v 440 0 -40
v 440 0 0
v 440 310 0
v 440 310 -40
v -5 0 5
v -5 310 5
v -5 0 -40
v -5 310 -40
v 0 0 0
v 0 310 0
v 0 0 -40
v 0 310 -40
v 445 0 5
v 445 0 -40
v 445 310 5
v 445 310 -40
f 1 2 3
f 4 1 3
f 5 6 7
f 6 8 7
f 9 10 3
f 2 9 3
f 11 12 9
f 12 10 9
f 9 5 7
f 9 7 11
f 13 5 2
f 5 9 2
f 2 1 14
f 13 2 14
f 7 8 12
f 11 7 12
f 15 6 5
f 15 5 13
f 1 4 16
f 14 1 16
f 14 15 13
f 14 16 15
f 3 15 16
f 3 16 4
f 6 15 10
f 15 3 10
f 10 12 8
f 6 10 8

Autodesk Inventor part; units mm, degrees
ref_plane "YZ Plane" through (0, 0, 0) normal (1, 0, 0) x (0, 1, 0)
ref_plane "XZ Plane" through (0, 0, 0) normal (0, 1, 0) x (-1, 0, 0)
ref_plane "XY Plane" through (0, 0, 0) normal (0, 0, 1) x (1, 0, 0)
sketch "Esboço1" plane through (0, 0, 0) normal (0, 0, 1) x (1, 0, 0)
  line L0 (0, 0) -> (440, 0)
  line L1 (440, 0) -> (440, 310)
  line L2 (440, 310) -> (0, 310)
  line L3 (0, 310) -> (0, 0)
  line L4 (440, 310) -> (445, 310)
  line L5 (445, 310) -> (445, 0)
  line L6 (445, 0) -> (440, 0)
  line L7 (0, 310) -> (-5, 310)
  line L8 (-5, 310) -> (-5, 0)
  line L9 (-5, 0) -> (0, 0)
  dimension "d0" = 440
  dimension "d1" = 310
  dimension "d2" = 5
  dimension "d3" = 5
extrude "Extrusão1" add sketch "Esboço1" along normal blind 5
extrude "Extrusão2" add sketch "Esboço1" against normal blind 40 contours L9 L8 L7 L3 | L1 L4 L5 L6
properties part number "TesteProteção"
